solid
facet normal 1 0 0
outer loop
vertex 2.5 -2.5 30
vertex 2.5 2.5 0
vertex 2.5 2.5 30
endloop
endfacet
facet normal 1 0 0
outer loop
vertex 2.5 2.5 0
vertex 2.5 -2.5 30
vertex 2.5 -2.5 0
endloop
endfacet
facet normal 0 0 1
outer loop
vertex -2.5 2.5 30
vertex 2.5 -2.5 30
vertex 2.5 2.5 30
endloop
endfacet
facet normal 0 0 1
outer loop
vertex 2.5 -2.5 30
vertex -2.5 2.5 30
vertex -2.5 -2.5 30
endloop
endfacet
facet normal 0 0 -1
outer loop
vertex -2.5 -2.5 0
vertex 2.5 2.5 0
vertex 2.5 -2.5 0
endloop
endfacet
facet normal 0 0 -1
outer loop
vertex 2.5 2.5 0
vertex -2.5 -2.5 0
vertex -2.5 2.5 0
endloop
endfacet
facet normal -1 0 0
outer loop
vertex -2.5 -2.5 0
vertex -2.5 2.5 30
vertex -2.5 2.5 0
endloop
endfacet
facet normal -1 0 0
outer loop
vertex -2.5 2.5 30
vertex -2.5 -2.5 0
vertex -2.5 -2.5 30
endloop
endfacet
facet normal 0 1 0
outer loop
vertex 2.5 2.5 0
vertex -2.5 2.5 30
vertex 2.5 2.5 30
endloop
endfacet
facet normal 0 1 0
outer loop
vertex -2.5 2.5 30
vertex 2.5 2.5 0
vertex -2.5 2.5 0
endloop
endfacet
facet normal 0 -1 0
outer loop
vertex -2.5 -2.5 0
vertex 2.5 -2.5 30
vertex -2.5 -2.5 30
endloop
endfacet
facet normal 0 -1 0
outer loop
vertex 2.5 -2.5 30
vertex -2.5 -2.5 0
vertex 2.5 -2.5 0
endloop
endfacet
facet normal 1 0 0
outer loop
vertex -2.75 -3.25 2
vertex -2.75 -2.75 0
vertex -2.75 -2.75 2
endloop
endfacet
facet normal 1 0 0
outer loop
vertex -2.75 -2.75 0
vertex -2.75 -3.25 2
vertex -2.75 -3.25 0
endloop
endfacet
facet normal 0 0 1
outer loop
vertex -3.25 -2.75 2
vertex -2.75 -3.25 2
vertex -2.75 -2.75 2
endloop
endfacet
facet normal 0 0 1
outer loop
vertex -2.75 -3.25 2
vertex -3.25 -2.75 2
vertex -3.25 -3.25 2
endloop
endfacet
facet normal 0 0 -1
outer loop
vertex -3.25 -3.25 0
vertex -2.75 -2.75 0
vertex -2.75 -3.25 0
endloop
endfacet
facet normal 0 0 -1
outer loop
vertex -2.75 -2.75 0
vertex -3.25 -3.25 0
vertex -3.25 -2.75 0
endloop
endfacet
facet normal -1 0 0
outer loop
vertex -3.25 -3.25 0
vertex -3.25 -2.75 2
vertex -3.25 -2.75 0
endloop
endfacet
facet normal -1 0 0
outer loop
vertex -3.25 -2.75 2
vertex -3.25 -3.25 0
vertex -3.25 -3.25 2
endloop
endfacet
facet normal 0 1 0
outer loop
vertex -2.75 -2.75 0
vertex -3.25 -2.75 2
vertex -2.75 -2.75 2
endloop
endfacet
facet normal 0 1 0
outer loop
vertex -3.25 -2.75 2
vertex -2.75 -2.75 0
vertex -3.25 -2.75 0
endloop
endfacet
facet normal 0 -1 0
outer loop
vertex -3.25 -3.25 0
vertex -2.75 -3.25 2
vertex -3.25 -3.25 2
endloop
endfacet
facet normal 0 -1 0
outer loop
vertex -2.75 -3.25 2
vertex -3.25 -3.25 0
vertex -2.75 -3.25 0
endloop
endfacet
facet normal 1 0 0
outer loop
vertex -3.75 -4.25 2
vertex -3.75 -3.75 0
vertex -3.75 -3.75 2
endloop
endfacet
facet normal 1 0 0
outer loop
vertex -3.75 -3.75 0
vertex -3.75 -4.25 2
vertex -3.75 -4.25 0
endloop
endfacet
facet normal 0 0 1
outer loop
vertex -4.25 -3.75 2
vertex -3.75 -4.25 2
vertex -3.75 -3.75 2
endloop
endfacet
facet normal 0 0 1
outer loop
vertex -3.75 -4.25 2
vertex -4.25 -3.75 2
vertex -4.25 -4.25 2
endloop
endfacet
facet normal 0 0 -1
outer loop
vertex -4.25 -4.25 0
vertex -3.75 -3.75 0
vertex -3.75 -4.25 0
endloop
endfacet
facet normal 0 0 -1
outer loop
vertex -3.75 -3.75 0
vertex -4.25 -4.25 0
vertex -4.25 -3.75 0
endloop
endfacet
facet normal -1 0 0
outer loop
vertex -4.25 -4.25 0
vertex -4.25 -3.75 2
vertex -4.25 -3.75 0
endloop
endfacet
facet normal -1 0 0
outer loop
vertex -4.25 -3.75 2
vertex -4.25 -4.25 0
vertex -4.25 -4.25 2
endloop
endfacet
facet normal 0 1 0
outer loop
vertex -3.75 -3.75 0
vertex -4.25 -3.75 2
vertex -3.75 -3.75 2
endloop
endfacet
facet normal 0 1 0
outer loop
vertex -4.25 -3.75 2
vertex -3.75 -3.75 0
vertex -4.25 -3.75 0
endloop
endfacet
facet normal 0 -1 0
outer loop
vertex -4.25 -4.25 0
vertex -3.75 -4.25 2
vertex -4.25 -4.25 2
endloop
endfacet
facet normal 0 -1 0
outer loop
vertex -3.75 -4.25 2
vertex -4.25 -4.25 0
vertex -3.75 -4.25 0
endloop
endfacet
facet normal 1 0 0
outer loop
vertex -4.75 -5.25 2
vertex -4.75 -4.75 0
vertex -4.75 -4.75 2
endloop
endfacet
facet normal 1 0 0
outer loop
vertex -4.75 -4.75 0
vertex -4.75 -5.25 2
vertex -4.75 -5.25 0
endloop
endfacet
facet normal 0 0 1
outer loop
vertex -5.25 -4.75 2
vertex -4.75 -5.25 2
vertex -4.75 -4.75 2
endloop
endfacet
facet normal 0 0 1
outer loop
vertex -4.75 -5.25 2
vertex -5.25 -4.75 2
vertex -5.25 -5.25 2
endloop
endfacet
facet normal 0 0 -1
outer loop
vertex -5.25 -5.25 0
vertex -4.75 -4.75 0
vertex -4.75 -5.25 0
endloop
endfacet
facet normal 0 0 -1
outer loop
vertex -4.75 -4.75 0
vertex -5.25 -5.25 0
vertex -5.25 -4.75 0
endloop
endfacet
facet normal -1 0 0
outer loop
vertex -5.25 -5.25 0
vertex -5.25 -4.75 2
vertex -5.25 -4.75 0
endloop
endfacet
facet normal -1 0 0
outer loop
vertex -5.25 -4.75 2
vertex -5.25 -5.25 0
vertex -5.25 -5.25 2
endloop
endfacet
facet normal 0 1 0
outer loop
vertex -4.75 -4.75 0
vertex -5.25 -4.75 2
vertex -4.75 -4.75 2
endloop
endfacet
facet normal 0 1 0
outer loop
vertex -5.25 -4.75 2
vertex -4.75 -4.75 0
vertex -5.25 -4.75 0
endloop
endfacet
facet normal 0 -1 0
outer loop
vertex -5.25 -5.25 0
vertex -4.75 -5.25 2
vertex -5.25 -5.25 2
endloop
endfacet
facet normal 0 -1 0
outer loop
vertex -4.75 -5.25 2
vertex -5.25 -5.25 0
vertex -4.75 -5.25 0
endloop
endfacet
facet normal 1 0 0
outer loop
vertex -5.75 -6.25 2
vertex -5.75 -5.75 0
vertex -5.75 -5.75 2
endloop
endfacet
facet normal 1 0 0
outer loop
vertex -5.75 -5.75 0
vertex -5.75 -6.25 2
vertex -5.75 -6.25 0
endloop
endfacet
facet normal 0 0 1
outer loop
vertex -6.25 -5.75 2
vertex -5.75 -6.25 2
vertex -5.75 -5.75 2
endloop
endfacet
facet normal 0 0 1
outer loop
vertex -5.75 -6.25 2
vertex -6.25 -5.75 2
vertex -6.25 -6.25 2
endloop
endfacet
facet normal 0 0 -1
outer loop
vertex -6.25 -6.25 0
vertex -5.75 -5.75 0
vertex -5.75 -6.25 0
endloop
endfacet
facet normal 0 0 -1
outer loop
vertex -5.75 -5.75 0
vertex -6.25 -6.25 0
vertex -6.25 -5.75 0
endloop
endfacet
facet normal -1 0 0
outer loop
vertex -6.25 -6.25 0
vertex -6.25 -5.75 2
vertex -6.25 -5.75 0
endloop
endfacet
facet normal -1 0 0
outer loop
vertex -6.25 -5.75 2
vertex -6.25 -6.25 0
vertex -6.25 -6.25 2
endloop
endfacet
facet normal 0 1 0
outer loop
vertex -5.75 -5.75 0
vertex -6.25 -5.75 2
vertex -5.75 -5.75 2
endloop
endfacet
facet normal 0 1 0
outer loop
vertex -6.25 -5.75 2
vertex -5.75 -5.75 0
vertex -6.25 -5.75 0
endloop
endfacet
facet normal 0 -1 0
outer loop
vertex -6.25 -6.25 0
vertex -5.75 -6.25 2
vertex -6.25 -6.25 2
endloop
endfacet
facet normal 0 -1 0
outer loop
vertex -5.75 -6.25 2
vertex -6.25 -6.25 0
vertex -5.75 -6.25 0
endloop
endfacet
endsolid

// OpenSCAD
translate([0, 0, 15]) color([0,1,0,0.9]) cube([5, 5, 30], center=true);
translate([-3, -3, 1]) color([1,0,0]) cube([0.5, 0.5, 2], center=true);
translate([-4, -4, 1]) color([1,0,0]) cube([0.5, 0.5, 2], center=true);
translate([-5, -5, 1]) color([1,0,0]) cube([0.5, 0.5, 2], center=true);
translate([-6, -6, 1]) color([1,0,0]) cube([0.5, 0.5, 2], center=true);
